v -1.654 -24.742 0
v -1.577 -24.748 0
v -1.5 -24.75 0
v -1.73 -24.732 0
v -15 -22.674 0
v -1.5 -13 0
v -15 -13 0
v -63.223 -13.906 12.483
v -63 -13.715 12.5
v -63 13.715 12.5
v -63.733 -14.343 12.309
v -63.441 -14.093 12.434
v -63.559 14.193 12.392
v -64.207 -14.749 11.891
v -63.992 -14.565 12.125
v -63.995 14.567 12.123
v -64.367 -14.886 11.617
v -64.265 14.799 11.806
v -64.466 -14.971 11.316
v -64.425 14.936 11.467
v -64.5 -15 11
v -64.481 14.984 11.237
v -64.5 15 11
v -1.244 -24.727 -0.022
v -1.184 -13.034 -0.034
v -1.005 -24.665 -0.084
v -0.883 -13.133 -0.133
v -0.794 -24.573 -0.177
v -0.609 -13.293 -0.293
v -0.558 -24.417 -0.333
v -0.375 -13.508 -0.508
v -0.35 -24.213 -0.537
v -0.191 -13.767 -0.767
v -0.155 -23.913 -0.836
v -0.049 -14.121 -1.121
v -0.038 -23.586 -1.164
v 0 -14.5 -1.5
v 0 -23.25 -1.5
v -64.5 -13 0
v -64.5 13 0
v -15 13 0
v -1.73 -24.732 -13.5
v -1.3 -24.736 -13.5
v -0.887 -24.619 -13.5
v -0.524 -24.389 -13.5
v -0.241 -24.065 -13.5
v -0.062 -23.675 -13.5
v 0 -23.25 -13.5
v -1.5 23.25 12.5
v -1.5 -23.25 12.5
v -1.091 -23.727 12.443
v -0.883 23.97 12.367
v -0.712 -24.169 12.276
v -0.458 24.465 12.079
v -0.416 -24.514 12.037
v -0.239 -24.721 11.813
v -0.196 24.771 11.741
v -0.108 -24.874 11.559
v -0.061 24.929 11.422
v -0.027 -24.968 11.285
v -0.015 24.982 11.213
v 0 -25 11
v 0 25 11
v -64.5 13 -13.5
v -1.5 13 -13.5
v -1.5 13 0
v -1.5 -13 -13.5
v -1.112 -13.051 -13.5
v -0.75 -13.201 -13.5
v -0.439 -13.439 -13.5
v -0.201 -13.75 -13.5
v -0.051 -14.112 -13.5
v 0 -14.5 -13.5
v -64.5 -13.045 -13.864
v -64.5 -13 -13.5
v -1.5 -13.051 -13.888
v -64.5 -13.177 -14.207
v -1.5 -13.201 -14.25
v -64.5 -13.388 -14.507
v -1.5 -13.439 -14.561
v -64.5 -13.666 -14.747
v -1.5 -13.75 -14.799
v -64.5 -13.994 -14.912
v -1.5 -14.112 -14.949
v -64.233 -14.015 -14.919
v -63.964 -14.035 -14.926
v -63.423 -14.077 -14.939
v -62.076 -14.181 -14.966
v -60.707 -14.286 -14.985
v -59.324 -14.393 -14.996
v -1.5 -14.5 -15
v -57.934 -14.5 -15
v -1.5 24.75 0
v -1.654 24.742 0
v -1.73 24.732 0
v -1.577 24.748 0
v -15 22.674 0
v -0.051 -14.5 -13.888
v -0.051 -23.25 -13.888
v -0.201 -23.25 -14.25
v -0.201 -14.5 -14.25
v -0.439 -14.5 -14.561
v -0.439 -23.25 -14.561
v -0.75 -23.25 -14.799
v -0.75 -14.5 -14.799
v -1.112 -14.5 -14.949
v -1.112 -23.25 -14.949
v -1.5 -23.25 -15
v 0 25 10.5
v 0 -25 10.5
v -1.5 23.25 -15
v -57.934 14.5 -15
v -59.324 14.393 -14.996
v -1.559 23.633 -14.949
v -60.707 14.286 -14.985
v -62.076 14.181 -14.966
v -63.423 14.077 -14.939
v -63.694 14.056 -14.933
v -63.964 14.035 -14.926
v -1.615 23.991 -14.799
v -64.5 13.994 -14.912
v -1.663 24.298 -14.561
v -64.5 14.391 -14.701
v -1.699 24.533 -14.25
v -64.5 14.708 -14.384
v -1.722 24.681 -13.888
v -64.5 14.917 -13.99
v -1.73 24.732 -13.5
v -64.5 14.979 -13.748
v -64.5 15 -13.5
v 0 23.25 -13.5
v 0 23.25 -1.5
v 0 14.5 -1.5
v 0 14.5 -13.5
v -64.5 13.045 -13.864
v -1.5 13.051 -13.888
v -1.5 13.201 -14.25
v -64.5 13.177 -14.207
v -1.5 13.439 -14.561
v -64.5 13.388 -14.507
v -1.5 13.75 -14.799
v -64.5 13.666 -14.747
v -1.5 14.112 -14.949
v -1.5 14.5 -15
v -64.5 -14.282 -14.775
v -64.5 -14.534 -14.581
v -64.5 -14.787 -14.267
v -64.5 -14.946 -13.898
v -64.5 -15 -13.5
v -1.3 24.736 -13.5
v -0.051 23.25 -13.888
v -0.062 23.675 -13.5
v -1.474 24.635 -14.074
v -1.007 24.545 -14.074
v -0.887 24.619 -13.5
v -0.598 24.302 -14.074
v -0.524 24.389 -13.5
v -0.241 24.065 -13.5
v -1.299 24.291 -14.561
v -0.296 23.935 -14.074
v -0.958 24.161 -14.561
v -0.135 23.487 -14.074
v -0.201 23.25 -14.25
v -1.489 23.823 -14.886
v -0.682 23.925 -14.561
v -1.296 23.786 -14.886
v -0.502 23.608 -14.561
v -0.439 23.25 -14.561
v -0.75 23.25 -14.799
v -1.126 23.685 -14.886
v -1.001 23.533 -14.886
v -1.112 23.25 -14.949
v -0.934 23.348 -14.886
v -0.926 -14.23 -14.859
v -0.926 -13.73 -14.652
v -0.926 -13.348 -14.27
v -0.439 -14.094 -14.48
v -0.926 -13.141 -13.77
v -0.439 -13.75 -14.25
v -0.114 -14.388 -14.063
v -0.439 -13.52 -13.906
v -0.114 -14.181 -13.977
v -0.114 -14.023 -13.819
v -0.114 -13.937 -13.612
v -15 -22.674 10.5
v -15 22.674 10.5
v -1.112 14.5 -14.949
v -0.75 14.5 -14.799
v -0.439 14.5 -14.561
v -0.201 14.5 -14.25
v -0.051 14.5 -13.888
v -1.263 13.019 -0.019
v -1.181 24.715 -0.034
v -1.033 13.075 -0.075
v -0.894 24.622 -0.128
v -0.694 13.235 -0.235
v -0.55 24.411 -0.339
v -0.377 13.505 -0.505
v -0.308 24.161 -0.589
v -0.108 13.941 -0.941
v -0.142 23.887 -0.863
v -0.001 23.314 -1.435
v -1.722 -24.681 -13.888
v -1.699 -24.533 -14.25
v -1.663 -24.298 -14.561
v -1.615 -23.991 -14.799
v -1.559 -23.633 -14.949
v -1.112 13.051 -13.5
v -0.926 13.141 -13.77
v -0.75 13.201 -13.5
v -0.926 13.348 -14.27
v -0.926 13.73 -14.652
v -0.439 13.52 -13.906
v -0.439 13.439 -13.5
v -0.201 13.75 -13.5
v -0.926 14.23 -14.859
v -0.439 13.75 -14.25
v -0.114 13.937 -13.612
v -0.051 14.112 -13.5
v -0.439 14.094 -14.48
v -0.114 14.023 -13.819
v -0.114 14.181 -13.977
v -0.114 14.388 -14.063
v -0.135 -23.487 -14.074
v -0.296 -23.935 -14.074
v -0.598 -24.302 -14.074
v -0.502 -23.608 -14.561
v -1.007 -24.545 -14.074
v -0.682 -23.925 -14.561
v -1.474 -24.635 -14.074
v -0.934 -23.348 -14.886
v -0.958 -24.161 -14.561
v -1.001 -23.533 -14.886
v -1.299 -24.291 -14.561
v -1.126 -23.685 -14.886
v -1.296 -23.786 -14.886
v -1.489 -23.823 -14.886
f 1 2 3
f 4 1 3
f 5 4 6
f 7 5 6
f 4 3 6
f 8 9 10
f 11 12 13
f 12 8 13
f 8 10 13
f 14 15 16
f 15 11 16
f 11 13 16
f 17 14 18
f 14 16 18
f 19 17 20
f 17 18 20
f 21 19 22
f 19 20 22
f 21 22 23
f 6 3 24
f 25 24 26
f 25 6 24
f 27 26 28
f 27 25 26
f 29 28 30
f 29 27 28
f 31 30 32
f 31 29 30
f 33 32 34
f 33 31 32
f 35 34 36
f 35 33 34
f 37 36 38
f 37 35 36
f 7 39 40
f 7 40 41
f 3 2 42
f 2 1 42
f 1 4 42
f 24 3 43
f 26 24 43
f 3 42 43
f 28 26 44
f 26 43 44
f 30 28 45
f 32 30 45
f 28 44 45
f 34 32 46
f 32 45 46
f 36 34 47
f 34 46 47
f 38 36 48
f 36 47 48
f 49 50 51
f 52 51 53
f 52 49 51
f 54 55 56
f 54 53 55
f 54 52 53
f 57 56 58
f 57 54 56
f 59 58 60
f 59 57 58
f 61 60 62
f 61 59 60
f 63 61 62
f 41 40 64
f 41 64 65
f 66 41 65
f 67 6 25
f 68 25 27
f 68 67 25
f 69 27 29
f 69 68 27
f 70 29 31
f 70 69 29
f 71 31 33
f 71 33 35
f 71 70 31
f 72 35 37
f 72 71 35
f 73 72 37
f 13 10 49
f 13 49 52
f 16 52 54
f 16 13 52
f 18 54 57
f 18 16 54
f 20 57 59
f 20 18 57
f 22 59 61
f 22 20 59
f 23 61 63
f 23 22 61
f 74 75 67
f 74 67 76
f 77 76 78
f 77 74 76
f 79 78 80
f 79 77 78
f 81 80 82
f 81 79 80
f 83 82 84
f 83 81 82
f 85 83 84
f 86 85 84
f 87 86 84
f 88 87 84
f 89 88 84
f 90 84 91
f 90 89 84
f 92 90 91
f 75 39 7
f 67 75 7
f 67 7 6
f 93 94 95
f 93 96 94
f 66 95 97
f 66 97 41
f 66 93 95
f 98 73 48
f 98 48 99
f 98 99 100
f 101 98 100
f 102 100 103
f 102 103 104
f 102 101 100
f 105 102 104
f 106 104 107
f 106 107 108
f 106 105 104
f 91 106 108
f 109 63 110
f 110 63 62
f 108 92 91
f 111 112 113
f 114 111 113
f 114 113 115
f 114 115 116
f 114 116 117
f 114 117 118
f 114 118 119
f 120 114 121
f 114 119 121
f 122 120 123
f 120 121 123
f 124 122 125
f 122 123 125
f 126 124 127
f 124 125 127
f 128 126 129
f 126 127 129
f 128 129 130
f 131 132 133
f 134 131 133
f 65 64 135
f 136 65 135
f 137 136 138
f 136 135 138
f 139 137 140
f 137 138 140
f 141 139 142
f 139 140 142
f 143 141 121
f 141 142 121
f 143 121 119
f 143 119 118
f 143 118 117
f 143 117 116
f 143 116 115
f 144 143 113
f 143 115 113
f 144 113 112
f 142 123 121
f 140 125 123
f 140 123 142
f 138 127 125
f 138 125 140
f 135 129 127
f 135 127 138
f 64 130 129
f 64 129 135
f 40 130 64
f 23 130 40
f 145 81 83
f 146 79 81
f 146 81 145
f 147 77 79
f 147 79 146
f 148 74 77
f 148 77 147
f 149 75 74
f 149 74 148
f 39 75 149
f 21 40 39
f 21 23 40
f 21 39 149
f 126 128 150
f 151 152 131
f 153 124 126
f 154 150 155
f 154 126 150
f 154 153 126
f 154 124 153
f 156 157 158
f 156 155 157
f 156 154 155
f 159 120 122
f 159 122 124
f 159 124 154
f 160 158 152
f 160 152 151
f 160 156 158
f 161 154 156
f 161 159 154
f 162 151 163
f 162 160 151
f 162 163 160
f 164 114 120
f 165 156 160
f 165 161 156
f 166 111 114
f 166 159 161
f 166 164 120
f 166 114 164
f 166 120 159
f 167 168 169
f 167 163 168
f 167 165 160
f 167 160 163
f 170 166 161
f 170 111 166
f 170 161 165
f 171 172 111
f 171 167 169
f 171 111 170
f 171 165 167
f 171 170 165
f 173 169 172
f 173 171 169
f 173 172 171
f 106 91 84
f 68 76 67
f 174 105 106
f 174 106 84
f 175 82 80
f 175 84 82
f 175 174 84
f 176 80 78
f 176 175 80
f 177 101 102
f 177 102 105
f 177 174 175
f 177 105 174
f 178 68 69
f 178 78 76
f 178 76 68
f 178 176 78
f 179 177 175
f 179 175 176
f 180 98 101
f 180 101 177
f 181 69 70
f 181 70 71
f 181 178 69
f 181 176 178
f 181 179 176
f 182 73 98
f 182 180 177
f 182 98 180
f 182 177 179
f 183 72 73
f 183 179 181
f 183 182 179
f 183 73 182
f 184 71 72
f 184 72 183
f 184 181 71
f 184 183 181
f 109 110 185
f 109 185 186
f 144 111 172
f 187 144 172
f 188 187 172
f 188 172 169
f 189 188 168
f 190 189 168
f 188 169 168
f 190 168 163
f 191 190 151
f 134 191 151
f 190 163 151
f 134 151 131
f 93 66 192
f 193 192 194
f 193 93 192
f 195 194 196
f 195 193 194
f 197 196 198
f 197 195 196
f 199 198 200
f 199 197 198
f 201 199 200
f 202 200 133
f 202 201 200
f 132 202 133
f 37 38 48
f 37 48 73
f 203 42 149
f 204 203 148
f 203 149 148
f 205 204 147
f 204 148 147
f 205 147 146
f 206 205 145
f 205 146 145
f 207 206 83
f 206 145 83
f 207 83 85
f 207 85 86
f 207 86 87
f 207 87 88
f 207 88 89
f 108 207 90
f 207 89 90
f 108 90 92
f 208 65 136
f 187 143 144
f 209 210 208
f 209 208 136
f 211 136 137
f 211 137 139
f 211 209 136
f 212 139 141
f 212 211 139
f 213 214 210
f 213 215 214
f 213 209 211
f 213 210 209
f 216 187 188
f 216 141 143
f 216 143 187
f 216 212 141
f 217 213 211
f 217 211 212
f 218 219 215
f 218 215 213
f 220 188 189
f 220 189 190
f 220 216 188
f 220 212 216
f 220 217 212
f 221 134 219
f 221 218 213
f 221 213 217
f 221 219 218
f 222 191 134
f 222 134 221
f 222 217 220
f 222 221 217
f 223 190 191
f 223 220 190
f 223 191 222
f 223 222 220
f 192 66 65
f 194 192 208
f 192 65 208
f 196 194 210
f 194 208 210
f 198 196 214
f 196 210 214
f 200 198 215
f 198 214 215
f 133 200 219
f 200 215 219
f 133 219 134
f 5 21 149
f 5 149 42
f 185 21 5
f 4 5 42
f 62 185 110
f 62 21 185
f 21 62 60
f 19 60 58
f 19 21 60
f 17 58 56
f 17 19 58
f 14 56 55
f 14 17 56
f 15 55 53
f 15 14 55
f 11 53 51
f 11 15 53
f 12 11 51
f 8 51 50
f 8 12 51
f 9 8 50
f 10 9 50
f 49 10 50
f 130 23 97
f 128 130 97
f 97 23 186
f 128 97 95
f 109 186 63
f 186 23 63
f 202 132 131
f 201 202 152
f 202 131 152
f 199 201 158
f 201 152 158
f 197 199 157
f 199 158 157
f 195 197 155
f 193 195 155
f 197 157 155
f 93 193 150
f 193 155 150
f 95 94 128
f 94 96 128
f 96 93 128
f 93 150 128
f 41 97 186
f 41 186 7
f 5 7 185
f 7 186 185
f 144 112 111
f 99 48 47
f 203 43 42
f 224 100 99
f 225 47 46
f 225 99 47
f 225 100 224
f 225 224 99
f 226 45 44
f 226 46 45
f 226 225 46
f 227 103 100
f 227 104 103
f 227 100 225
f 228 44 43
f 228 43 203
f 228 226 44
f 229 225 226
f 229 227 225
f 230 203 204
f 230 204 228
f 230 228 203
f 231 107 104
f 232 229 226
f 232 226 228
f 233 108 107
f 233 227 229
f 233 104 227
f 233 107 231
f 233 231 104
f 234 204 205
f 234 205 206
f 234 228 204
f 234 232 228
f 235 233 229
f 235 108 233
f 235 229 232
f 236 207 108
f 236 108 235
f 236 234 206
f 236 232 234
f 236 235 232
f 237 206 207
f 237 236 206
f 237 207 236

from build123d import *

# Parameters (mm, degrees)
F0_W         = 64.5
F0_H         = 13
F0_H_2       = 2
F1_DEPTH     = 12.5
F2_DEPTH     = 15
F4_DEPTH     = 15
F6_T1_DEPTH  = 72.7705906209
F6_T3_DEPTH  = 57.5
F6_T5_DEPTH  = 72.7705906209
F6_T7_DEPTH  = 37.5
F6_T9_DEPTH  = 66.75
F6_T11_DEPTH = 67.2701117692
F6_T13_DEPTH = 8.7495211484
F6_T15_DEPTH = 67.2701117692
F6_T17_DEPTH = 8.7495211484
F6_T19_DEPTH = 17.8761971291
F6_T21_DEPTH = 17.25
F6_T23_DEPTH = 19.5
F6_T25_DEPTH = 19.5
F6_S29_W     = 1.53
F6_S29_H     = 1.53
F6_T30_DEPTH = 1.53
F6_T36_DEPTH = 1.53
F6_S41_W     = 1.53
F6_S41_H     = 1.53
F6_T42_DEPTH = 1.53
F6_T48_DEPTH = 1.53
F6_T54_DEPTH = 9.5
F6_S55_R     = 1.5
F6_T56_DEPTH = 6
F6_T60_DEPTH = 9.5
F6_S61_R     = 1.5
F6_T62_DEPTH = 6
F6_T66_DEPTH = 9.5
F6_S67_R     = 1.5
F6_T68_DEPTH = 6
F6_T72_DEPTH = 9.5
F6_S73_R     = 1.5
F6_T74_DEPTH = 6


# Not quite as in the source:
# - a fillet or chamfer that OpenCascade refuses, or shapes differently, is made with other operations: its cross-section is extruded or revolved along the edge and cut away or added
# - a feature names something its author has since deleted; it is built from what else it names


with BuildPart() as f1:
    # F0 (on Top) → F1 (new body)
    with BuildSketch(Plane.XY):
        with Locations((-32.25, -6.5)):
            Rectangle(F0_W, F0_H)
        with Locations((-32.25, -14)):
            Rectangle(F0_W, F0_H_2)
        Polygon((0, -15), (-64.5, -15), (0, -25), align=None)
    extrude(amount=F1_DEPTH)

    # F0 (on Top) → F2 (join)
    with BuildSketch(Plane.XY):
        with Locations((-32.25, -14)):
            Rectangle(F0_W, F0_H_2)
        Polygon((0, -15), (-64.5, -15), (0, -25), align=None)
    extrude(amount=-F2_DEPTH)

    # F3 (on face) → F4 (cut)
    with BuildSketch(Plane.YZ):
        Polygon((-13, 0), (0, 0), (0, 10.5), (-25, 10.5), (-25, 0), align=None)
    extrude(amount=-F4_DEPTH, mode=Mode.SUBTRACT)

    # F5: F1 across plane


with BuildPart() as f1_1:
    add(f1.part)
    add(f1.part.mirror(Plane.XZ))

    # F6: fillet of radius 1.5 on 18 edges, made by hand

    # F6_s2 → F6_t1 (cut)
    with BuildSketch(Plane(origin=(-64.4207380098, 9.9877113194, 0), x_dir=(0, 0, 1), z_dir=(0.9881939076, -0.1532083578, 0))):
        with BuildLine():
            ThreePointArc((11, 24.7048476911), (12.0606601718, 24.2655078629), (12.5, 23.2048476911))
            Line((12.5, 23.2048476911), (12.5, 24.7048476911))
            Line((12.5, 24.7048476911), (11, 24.7048476911))
        make_face()
    extrude(amount=F6_T1_DEPTH, mode=Mode.SUBTRACT)

    # F6_s4 → F6_t3 (cut)
    with BuildSketch(Plane.XZ.offset(-28.75)):
        with BuildLine():
            ThreePointArc((-1.5, 12.5), (-0.4393398282, 12.0606601718), (0, 11))
            Line((0, 11), (0, 12.5))
            Line((0, 12.5), (-1.5, 12.5))
        make_face()
    extrude(amount=F6_T3_DEPTH, mode=Mode.SUBTRACT)

    # F6_s6 → F6_t5 (cut)
    with BuildSketch(Plane(origin=(-64.4207380098, -9.9877113194, 0), x_dir=(0, 0, 1), z_dir=(0.9881939076, 0.1532083578, 0))):
        with BuildLine():
            ThreePointArc((12.5, -23.2048476911), (12.0606601718, -24.2655078629), (11, -24.7048476911))
            Line((11, -24.7048476911), (12.5, -24.7048476911))
            Line((12.5, -24.7048476911), (12.5, -23.2048476911))
        make_face()
    extrude(amount=F6_T5_DEPTH, mode=Mode.SUBTRACT)

    # F6_s8 → F6_t7 (cut)
    with BuildSketch(Plane.XZ.offset(-18.75)):
        with BuildLine():
            ThreePointArc((-63, 12.5), (-64.0606601718, 12.0606601718), (-64.5, 11))
            Line((-64.5, 11), (-64.5, 12.5))
            Line((-64.5, 12.5), (-63, 12.5))
        make_face()
    extrude(amount=F6_T7_DEPTH, mode=Mode.SUBTRACT)

    # F6_s10 → F6_t9 (cut)
    with BuildSketch(Plane.YZ.offset(-68.25)):
        with BuildLine():
            ThreePointArc((-13, -13.5), (-13.4393398282, -14.5606601718), (-14.5, -15))
            Line((-14.5, -15), (-13, -15))
            Line((-13, -15), (-13, -13.5))
        make_face()
        with BuildLine():
            ThreePointArc((13, -13.5), (13.4393398282, -14.5606601718), (14.5, -15))
            Line((14.5, -15), (13, -15))
            Line((13, -15), (13, -13.5))
        make_face()
    extrude(amount=F6_T9_DEPTH, mode=Mode.SUBTRACT)

    # F6_s12 → F6_t11 (cut)
    with BuildSketch(Plane(origin=(-64.4207380098, 9.9877113194, 0), x_dir=(0, 0, 1), z_dir=(0.9881939076, -0.1532083578, 0))):
        with BuildLine():
            ThreePointArc((-13.5, 24.7048476911), (-14.5606601718, 24.2655078629), (-15, 23.2048476911))
            Line((-15, 23.2048476911), (-15, 24.7048476911))
            Line((-15, 24.7048476911), (-13.5, 24.7048476911))
        make_face()
    extrude(amount=F6_T11_DEPTH, mode=Mode.SUBTRACT)

    # F6_s14 → F6_t13 (cut)
    with BuildSketch(Plane.XZ.offset(14.5)):
        with BuildLine():
            ThreePointArc((0, -13.5), (-0.4393398282, -14.5606601718), (-1.5, -15))
            Line((-1.5, -15), (0, -15))
            Line((0, -15), (0, -13.5))
        make_face()
    extrude(amount=F6_T13_DEPTH, mode=Mode.SUBTRACT)

    # F6_s16 → F6_t15 (cut)
    with BuildSketch(Plane(origin=(-64.4207380098, -9.9877113194, 0), x_dir=(0, 0, 1), z_dir=(0.9881939076, 0.1532083578, 0))):
        with BuildLine():
            ThreePointArc((-15, -23.2048476911), (-14.5606601718, -24.2655078629), (-13.5, -24.7048476911))
            Line((-13.5, -24.7048476911), (-15, -24.7048476911))
            Line((-15, -24.7048476911), (-15, -23.2048476911))
        make_face()
    extrude(amount=F6_T15_DEPTH, mode=Mode.SUBTRACT)

    # F6_s18 → F6_t17 (cut)
    with BuildSketch(Plane.XZ.offset(-23.2495211484)):
        with BuildLine():
            ThreePointArc((-1.5, -15), (-0.4393398282, -14.5606601718), (0, -13.5))
            Line((0, -13.5), (0, -15))
            Line((0, -15), (-1.5, -15))
        make_face()
    extrude(amount=F6_T17_DEPTH, mode=Mode.SUBTRACT)

    # F6_s20 → F6_t19 (cut)
    with BuildSketch(Plane.XY.offset(-13.5)):
        with BuildLine():
            ThreePointArc((-1.7298125367, -24.7318120098), (-0.5239669076, -24.3885380062), (0, -23.2495211484))
            Line((0, -23.2495211484), (0, -25))
            Line((0, -25), (-1.7298125367, -24.7318120098))
        make_face()
        with BuildLine():
            ThreePointArc((0, 23.2495211484), (-0.5239669076, 24.3885380062), (-1.7298125367, 24.7318120098))
            Line((-1.7298125367, 24.7318120098), (0, 25))
            Line((0, 25), (0, 23.2495211484))
        make_face()
    extrude(amount=F6_T19_DEPTH, mode=Mode.SUBTRACT)

    # F6_s22 → F6_t21 (cut)
    with BuildSketch(Plane.XY.offset(-13.5)):
        with BuildLine():
            ThreePointArc((-1.5, -13), (-0.4393398282, -13.4393398282), (0, -14.5))
            Line((0, -14.5), (0, -13))
            Line((0, -13), (-1.5, -13))
        make_face()
        with BuildLine():
            ThreePointArc((-1.5, 13), (-0.4393398282, 13.4393398282), (0, 14.5))
            Line((0, 14.5), (0, 13))
            Line((0, 13), (-1.5, 13))
        make_face()
    extrude(amount=F6_T21_DEPTH, mode=Mode.SUBTRACT)

    # F6_s24 → F6_t23 (cut)
    with BuildSketch(Plane.XZ.offset(9.25)):
        with BuildLine():
            ThreePointArc((-1.5, 0), (-0.4393398282, -0.4393398282), (0, -1.5))
            Line((0, -1.5), (0, 0))
            Line((0, 0), (-1.5, 0))
        make_face()
    extrude(amount=F6_T23_DEPTH, mode=Mode.SUBTRACT)

    # F6_s26 → F6_t25 (cut)
    with BuildSketch(Plane.XZ.offset(-28.75)):
        with BuildLine():
            ThreePointArc((-1.5, 0), (-0.4393398282, -0.4393398282), (0, -1.5))
            Line((0, -1.5), (0, 0))
            Line((0, 0), (-1.5, 0))
        make_face()
    extrude(amount=F6_T25_DEPTH, mode=Mode.SUBTRACT)


with BuildPart() as f6_tool28:
    # F6_s29 → F6_t30 (new body)
    with BuildSketch(Plane.YZ.offset(-1.5)):
        with Locations((-13.735, -14.265)):
            Rectangle(F6_S29_W, F6_S29_H)
    extrude(amount=F6_T30_DEPTH)

    # F6_s31 → F6_t32 (revolve, cut)
    with BuildSketch(Plane(origin=(-1.5, -14.5, -13.5), x_dir=(0, -0.7071067812, 0.7071067812), z_dir=(0, 0.7071067812, 0.7071067812))):
        with BuildLine():
            ThreePointArc((0, -1.5), (1.5, 0), (0, 1.5))
            Line((0, 1.5), (0, -1.5))
        make_face()
    revolve(axis=Axis((-1.5, -14.5, -13.5), (1, 0, 0)), mode=Mode.SUBTRACT)


with BuildPart() as f1_2:
    add(f1_1.part)

    # F6_t27: cut F6_tool28
    add(f6_tool28.part, mode=Mode.SUBTRACT)


with BuildPart() as f6_tool34:
    # F6_s35 → F6_t36 (new body)
    with BuildSketch(Plane.XY.offset(-13.5)):
        Polygon((-1.5, -23.2495211484), (-1.7344087874, -24.761457827), (0.03, -25.035009577), (0.03, -23.2495211484), align=None)
    extrude(amount=-F6_T36_DEPTH)

    # F6_s37 → F6_t38 (revolve, cut)
    with BuildSketch(Plane(origin=(-1.5, -23.2495211484, -13.5), x_dir=(-0.6506887283, 0.7593445719, 0), z_dir=(-0.7593445719, -0.6506887283, 0))):
        with BuildLine():
            ThreePointArc((0, -1.5), (1.5, 0), (0, 1.5))
            Line((0, 1.5), (0, -1.5))
        make_face()
    revolve(axis=Axis((-1.5, -23.2495211484, -13.5), (0, 0, -1)), mode=Mode.SUBTRACT)


with BuildPart() as f1_3:
    add(f1_2.part)

    # F6_t33: cut F6_tool34
    add(f6_tool34.part, mode=Mode.SUBTRACT)


with BuildPart() as f6_tool40:
    # F6_s41 → F6_t42 (new body)
    with BuildSketch(Plane.YZ.offset(-1.5)):
        with Locations((13.735, -14.265)):
            Rectangle(F6_S41_W, F6_S41_H)
    extrude(amount=F6_T42_DEPTH)

    # F6_s43 → F6_t44 (revolve, cut)
    with BuildSketch(Plane(origin=(-1.5, 14.5, -13.5), x_dir=(0, 0.7071067812, 0.7071067812), z_dir=(0, 0.7071067812, -0.7071067812))):
        with BuildLine():
            ThreePointArc((0, -1.5), (1.5, 0), (0, 1.5))
            Line((0, 1.5), (0, -1.5))
        make_face()
    revolve(axis=Axis((-1.5, 14.5, -13.5), (1, 0, 0)), mode=Mode.SUBTRACT)


with BuildPart() as f1_4:
    add(f1_3.part)

    # F6_t39: cut F6_tool40
    add(f6_tool40.part, mode=Mode.SUBTRACT)


with BuildPart() as f6_tool46:
    # F6_s47 → F6_t48 (new body)
    with BuildSketch(Plane.XY.offset(-13.5)):
        Polygon((-1.5, 23.2495211484), (0.03, 23.2495211484), (0.03, 25.035009577), (-1.7344087874, 24.761457827), align=None)
    extrude(amount=-F6_T48_DEPTH)

    # F6_s49 → F6_t50 (revolve, cut)
    with BuildSketch(Plane(origin=(-1.5, 23.2495211484, -13.5), x_dir=(-0.6506887283, -0.7593445719, 0), z_dir=(0.7593445719, -0.6506887283, 0))):
        with BuildLine():
            ThreePointArc((0, -1.5), (1.5, 0), (0, 1.5))
            Line((0, 1.5), (0, -1.5))
        make_face()
    revolve(axis=Axis((-1.5, 23.2495211484, -13.5), (0, 0, -1)), mode=Mode.SUBTRACT)


with BuildPart() as f1_5:
    add(f1_4.part)

    # F6_t45: cut F6_tool46
    add(f6_tool46.part, mode=Mode.SUBTRACT)


with BuildPart() as f6_tool52:
    # F6_s53 → F6_t54 (new body)
    with BuildSketch(Plane.XZ.offset(9.25)):
        with BuildLine():
            ThreePointArc((-63, -15), (-64.0606601718, -14.5606601718), (-64.5, -13.5))
            Line((-64.5, -13.5), (-64.5, -15))
            Line((-64.5, -15), (-63, -15))
        make_face()
    extrude(amount=F6_T54_DEPTH)

    # F6_s55 → F6_t56 (cut, symmetric)
    with BuildSketch(Plane(origin=(-60.1810089756, 9.3303889885, 0), x_dir=(0, 0, 1), z_dir=(-0.9881939076, 0.1532083578, 0))):
        with Locations((-13.5, -23.2048476911)):
            Circle(F6_S55_R)
    extrude(amount=F6_T56_DEPTH, both=True, mode=Mode.SUBTRACT)


with BuildPart() as f1_6:
    add(f1_5.part)

    # F6_t51: cut F6_tool52
    add(f6_tool52.part, mode=Mode.SUBTRACT)


with BuildPart() as f6_tool58:
    # F6_s59 → F6_t60 (new body)
    with BuildSketch(Plane.XZ.offset(9.25)):
        with BuildLine():
            ThreePointArc((-63, -15), (-64.0606601718, -14.5606601718), (-64.5, -13.5))
            Line((-64.5, -13.5), (-64.5, -15))
            Line((-64.5, -15), (-63, -15))
        make_face()
    extrude(amount=F6_T60_DEPTH)

    # F6_s61 → F6_t62 (cut, symmetric)
    with BuildSketch(Plane.YZ.offset(-63.8)):
        with Locations((-14.5, -13.5)):
            Circle(F6_S61_R)
    extrude(amount=F6_T62_DEPTH, both=True, mode=Mode.SUBTRACT)


with BuildPart() as f1_7:
    add(f1_6.part)

    # F6_t57: cut F6_tool58
    add(f6_tool58.part, mode=Mode.SUBTRACT)


with BuildPart() as f6_tool64:
    # F6_s65 → F6_t66 (new body)
    with BuildSketch(Plane.XZ.offset(-9.25)):
        with BuildLine():
            ThreePointArc((-63, -15), (-64.0606601718, -14.5606601718), (-64.5, -13.5))
            Line((-64.5, -13.5), (-64.5, -15))
            Line((-64.5, -15), (-63, -15))
        make_face()
    extrude(amount=-F6_T66_DEPTH)

    # F6_s67 → F6_t68 (cut, symmetric)
    with BuildSketch(Plane(origin=(-60.1810089756, -9.3303889885, 0), x_dir=(0, 0, 1), z_dir=(-0.9881939076, -0.1532083578, 0))):
        with Locations((-13.5, 23.2048476911)):
            Circle(F6_S67_R)
    extrude(amount=F6_T68_DEPTH, both=True, mode=Mode.SUBTRACT)


with BuildPart() as f1_8:
    add(f1_7.part)

    # F6_t63: cut F6_tool64
    add(f6_tool64.part, mode=Mode.SUBTRACT)


with BuildPart() as f6_tool70:
    # F6_s71 → F6_t72 (new body)
    with BuildSketch(Plane.XZ.offset(-9.25)):
        with BuildLine():
            ThreePointArc((-63, -15), (-64.0606601718, -14.5606601718), (-64.5, -13.5))
            Line((-64.5, -13.5), (-64.5, -15))
            Line((-64.5, -15), (-63, -15))
        make_face()
    extrude(amount=-F6_T72_DEPTH)

    # F6_s73 → F6_t74 (cut, symmetric)
    with BuildSketch(Plane.YZ.offset(-63.8)):
        with Locations((14.5, -13.5)):
            Circle(F6_S73_R)
    extrude(amount=F6_T74_DEPTH, both=True, mode=Mode.SUBTRACT)


with BuildPart() as f1_9:
    add(f1_8.part)

    # F6_t69: cut F6_tool70
    add(f6_tool70.part, mode=Mode.SUBTRACT)


solid = f1_9.part
